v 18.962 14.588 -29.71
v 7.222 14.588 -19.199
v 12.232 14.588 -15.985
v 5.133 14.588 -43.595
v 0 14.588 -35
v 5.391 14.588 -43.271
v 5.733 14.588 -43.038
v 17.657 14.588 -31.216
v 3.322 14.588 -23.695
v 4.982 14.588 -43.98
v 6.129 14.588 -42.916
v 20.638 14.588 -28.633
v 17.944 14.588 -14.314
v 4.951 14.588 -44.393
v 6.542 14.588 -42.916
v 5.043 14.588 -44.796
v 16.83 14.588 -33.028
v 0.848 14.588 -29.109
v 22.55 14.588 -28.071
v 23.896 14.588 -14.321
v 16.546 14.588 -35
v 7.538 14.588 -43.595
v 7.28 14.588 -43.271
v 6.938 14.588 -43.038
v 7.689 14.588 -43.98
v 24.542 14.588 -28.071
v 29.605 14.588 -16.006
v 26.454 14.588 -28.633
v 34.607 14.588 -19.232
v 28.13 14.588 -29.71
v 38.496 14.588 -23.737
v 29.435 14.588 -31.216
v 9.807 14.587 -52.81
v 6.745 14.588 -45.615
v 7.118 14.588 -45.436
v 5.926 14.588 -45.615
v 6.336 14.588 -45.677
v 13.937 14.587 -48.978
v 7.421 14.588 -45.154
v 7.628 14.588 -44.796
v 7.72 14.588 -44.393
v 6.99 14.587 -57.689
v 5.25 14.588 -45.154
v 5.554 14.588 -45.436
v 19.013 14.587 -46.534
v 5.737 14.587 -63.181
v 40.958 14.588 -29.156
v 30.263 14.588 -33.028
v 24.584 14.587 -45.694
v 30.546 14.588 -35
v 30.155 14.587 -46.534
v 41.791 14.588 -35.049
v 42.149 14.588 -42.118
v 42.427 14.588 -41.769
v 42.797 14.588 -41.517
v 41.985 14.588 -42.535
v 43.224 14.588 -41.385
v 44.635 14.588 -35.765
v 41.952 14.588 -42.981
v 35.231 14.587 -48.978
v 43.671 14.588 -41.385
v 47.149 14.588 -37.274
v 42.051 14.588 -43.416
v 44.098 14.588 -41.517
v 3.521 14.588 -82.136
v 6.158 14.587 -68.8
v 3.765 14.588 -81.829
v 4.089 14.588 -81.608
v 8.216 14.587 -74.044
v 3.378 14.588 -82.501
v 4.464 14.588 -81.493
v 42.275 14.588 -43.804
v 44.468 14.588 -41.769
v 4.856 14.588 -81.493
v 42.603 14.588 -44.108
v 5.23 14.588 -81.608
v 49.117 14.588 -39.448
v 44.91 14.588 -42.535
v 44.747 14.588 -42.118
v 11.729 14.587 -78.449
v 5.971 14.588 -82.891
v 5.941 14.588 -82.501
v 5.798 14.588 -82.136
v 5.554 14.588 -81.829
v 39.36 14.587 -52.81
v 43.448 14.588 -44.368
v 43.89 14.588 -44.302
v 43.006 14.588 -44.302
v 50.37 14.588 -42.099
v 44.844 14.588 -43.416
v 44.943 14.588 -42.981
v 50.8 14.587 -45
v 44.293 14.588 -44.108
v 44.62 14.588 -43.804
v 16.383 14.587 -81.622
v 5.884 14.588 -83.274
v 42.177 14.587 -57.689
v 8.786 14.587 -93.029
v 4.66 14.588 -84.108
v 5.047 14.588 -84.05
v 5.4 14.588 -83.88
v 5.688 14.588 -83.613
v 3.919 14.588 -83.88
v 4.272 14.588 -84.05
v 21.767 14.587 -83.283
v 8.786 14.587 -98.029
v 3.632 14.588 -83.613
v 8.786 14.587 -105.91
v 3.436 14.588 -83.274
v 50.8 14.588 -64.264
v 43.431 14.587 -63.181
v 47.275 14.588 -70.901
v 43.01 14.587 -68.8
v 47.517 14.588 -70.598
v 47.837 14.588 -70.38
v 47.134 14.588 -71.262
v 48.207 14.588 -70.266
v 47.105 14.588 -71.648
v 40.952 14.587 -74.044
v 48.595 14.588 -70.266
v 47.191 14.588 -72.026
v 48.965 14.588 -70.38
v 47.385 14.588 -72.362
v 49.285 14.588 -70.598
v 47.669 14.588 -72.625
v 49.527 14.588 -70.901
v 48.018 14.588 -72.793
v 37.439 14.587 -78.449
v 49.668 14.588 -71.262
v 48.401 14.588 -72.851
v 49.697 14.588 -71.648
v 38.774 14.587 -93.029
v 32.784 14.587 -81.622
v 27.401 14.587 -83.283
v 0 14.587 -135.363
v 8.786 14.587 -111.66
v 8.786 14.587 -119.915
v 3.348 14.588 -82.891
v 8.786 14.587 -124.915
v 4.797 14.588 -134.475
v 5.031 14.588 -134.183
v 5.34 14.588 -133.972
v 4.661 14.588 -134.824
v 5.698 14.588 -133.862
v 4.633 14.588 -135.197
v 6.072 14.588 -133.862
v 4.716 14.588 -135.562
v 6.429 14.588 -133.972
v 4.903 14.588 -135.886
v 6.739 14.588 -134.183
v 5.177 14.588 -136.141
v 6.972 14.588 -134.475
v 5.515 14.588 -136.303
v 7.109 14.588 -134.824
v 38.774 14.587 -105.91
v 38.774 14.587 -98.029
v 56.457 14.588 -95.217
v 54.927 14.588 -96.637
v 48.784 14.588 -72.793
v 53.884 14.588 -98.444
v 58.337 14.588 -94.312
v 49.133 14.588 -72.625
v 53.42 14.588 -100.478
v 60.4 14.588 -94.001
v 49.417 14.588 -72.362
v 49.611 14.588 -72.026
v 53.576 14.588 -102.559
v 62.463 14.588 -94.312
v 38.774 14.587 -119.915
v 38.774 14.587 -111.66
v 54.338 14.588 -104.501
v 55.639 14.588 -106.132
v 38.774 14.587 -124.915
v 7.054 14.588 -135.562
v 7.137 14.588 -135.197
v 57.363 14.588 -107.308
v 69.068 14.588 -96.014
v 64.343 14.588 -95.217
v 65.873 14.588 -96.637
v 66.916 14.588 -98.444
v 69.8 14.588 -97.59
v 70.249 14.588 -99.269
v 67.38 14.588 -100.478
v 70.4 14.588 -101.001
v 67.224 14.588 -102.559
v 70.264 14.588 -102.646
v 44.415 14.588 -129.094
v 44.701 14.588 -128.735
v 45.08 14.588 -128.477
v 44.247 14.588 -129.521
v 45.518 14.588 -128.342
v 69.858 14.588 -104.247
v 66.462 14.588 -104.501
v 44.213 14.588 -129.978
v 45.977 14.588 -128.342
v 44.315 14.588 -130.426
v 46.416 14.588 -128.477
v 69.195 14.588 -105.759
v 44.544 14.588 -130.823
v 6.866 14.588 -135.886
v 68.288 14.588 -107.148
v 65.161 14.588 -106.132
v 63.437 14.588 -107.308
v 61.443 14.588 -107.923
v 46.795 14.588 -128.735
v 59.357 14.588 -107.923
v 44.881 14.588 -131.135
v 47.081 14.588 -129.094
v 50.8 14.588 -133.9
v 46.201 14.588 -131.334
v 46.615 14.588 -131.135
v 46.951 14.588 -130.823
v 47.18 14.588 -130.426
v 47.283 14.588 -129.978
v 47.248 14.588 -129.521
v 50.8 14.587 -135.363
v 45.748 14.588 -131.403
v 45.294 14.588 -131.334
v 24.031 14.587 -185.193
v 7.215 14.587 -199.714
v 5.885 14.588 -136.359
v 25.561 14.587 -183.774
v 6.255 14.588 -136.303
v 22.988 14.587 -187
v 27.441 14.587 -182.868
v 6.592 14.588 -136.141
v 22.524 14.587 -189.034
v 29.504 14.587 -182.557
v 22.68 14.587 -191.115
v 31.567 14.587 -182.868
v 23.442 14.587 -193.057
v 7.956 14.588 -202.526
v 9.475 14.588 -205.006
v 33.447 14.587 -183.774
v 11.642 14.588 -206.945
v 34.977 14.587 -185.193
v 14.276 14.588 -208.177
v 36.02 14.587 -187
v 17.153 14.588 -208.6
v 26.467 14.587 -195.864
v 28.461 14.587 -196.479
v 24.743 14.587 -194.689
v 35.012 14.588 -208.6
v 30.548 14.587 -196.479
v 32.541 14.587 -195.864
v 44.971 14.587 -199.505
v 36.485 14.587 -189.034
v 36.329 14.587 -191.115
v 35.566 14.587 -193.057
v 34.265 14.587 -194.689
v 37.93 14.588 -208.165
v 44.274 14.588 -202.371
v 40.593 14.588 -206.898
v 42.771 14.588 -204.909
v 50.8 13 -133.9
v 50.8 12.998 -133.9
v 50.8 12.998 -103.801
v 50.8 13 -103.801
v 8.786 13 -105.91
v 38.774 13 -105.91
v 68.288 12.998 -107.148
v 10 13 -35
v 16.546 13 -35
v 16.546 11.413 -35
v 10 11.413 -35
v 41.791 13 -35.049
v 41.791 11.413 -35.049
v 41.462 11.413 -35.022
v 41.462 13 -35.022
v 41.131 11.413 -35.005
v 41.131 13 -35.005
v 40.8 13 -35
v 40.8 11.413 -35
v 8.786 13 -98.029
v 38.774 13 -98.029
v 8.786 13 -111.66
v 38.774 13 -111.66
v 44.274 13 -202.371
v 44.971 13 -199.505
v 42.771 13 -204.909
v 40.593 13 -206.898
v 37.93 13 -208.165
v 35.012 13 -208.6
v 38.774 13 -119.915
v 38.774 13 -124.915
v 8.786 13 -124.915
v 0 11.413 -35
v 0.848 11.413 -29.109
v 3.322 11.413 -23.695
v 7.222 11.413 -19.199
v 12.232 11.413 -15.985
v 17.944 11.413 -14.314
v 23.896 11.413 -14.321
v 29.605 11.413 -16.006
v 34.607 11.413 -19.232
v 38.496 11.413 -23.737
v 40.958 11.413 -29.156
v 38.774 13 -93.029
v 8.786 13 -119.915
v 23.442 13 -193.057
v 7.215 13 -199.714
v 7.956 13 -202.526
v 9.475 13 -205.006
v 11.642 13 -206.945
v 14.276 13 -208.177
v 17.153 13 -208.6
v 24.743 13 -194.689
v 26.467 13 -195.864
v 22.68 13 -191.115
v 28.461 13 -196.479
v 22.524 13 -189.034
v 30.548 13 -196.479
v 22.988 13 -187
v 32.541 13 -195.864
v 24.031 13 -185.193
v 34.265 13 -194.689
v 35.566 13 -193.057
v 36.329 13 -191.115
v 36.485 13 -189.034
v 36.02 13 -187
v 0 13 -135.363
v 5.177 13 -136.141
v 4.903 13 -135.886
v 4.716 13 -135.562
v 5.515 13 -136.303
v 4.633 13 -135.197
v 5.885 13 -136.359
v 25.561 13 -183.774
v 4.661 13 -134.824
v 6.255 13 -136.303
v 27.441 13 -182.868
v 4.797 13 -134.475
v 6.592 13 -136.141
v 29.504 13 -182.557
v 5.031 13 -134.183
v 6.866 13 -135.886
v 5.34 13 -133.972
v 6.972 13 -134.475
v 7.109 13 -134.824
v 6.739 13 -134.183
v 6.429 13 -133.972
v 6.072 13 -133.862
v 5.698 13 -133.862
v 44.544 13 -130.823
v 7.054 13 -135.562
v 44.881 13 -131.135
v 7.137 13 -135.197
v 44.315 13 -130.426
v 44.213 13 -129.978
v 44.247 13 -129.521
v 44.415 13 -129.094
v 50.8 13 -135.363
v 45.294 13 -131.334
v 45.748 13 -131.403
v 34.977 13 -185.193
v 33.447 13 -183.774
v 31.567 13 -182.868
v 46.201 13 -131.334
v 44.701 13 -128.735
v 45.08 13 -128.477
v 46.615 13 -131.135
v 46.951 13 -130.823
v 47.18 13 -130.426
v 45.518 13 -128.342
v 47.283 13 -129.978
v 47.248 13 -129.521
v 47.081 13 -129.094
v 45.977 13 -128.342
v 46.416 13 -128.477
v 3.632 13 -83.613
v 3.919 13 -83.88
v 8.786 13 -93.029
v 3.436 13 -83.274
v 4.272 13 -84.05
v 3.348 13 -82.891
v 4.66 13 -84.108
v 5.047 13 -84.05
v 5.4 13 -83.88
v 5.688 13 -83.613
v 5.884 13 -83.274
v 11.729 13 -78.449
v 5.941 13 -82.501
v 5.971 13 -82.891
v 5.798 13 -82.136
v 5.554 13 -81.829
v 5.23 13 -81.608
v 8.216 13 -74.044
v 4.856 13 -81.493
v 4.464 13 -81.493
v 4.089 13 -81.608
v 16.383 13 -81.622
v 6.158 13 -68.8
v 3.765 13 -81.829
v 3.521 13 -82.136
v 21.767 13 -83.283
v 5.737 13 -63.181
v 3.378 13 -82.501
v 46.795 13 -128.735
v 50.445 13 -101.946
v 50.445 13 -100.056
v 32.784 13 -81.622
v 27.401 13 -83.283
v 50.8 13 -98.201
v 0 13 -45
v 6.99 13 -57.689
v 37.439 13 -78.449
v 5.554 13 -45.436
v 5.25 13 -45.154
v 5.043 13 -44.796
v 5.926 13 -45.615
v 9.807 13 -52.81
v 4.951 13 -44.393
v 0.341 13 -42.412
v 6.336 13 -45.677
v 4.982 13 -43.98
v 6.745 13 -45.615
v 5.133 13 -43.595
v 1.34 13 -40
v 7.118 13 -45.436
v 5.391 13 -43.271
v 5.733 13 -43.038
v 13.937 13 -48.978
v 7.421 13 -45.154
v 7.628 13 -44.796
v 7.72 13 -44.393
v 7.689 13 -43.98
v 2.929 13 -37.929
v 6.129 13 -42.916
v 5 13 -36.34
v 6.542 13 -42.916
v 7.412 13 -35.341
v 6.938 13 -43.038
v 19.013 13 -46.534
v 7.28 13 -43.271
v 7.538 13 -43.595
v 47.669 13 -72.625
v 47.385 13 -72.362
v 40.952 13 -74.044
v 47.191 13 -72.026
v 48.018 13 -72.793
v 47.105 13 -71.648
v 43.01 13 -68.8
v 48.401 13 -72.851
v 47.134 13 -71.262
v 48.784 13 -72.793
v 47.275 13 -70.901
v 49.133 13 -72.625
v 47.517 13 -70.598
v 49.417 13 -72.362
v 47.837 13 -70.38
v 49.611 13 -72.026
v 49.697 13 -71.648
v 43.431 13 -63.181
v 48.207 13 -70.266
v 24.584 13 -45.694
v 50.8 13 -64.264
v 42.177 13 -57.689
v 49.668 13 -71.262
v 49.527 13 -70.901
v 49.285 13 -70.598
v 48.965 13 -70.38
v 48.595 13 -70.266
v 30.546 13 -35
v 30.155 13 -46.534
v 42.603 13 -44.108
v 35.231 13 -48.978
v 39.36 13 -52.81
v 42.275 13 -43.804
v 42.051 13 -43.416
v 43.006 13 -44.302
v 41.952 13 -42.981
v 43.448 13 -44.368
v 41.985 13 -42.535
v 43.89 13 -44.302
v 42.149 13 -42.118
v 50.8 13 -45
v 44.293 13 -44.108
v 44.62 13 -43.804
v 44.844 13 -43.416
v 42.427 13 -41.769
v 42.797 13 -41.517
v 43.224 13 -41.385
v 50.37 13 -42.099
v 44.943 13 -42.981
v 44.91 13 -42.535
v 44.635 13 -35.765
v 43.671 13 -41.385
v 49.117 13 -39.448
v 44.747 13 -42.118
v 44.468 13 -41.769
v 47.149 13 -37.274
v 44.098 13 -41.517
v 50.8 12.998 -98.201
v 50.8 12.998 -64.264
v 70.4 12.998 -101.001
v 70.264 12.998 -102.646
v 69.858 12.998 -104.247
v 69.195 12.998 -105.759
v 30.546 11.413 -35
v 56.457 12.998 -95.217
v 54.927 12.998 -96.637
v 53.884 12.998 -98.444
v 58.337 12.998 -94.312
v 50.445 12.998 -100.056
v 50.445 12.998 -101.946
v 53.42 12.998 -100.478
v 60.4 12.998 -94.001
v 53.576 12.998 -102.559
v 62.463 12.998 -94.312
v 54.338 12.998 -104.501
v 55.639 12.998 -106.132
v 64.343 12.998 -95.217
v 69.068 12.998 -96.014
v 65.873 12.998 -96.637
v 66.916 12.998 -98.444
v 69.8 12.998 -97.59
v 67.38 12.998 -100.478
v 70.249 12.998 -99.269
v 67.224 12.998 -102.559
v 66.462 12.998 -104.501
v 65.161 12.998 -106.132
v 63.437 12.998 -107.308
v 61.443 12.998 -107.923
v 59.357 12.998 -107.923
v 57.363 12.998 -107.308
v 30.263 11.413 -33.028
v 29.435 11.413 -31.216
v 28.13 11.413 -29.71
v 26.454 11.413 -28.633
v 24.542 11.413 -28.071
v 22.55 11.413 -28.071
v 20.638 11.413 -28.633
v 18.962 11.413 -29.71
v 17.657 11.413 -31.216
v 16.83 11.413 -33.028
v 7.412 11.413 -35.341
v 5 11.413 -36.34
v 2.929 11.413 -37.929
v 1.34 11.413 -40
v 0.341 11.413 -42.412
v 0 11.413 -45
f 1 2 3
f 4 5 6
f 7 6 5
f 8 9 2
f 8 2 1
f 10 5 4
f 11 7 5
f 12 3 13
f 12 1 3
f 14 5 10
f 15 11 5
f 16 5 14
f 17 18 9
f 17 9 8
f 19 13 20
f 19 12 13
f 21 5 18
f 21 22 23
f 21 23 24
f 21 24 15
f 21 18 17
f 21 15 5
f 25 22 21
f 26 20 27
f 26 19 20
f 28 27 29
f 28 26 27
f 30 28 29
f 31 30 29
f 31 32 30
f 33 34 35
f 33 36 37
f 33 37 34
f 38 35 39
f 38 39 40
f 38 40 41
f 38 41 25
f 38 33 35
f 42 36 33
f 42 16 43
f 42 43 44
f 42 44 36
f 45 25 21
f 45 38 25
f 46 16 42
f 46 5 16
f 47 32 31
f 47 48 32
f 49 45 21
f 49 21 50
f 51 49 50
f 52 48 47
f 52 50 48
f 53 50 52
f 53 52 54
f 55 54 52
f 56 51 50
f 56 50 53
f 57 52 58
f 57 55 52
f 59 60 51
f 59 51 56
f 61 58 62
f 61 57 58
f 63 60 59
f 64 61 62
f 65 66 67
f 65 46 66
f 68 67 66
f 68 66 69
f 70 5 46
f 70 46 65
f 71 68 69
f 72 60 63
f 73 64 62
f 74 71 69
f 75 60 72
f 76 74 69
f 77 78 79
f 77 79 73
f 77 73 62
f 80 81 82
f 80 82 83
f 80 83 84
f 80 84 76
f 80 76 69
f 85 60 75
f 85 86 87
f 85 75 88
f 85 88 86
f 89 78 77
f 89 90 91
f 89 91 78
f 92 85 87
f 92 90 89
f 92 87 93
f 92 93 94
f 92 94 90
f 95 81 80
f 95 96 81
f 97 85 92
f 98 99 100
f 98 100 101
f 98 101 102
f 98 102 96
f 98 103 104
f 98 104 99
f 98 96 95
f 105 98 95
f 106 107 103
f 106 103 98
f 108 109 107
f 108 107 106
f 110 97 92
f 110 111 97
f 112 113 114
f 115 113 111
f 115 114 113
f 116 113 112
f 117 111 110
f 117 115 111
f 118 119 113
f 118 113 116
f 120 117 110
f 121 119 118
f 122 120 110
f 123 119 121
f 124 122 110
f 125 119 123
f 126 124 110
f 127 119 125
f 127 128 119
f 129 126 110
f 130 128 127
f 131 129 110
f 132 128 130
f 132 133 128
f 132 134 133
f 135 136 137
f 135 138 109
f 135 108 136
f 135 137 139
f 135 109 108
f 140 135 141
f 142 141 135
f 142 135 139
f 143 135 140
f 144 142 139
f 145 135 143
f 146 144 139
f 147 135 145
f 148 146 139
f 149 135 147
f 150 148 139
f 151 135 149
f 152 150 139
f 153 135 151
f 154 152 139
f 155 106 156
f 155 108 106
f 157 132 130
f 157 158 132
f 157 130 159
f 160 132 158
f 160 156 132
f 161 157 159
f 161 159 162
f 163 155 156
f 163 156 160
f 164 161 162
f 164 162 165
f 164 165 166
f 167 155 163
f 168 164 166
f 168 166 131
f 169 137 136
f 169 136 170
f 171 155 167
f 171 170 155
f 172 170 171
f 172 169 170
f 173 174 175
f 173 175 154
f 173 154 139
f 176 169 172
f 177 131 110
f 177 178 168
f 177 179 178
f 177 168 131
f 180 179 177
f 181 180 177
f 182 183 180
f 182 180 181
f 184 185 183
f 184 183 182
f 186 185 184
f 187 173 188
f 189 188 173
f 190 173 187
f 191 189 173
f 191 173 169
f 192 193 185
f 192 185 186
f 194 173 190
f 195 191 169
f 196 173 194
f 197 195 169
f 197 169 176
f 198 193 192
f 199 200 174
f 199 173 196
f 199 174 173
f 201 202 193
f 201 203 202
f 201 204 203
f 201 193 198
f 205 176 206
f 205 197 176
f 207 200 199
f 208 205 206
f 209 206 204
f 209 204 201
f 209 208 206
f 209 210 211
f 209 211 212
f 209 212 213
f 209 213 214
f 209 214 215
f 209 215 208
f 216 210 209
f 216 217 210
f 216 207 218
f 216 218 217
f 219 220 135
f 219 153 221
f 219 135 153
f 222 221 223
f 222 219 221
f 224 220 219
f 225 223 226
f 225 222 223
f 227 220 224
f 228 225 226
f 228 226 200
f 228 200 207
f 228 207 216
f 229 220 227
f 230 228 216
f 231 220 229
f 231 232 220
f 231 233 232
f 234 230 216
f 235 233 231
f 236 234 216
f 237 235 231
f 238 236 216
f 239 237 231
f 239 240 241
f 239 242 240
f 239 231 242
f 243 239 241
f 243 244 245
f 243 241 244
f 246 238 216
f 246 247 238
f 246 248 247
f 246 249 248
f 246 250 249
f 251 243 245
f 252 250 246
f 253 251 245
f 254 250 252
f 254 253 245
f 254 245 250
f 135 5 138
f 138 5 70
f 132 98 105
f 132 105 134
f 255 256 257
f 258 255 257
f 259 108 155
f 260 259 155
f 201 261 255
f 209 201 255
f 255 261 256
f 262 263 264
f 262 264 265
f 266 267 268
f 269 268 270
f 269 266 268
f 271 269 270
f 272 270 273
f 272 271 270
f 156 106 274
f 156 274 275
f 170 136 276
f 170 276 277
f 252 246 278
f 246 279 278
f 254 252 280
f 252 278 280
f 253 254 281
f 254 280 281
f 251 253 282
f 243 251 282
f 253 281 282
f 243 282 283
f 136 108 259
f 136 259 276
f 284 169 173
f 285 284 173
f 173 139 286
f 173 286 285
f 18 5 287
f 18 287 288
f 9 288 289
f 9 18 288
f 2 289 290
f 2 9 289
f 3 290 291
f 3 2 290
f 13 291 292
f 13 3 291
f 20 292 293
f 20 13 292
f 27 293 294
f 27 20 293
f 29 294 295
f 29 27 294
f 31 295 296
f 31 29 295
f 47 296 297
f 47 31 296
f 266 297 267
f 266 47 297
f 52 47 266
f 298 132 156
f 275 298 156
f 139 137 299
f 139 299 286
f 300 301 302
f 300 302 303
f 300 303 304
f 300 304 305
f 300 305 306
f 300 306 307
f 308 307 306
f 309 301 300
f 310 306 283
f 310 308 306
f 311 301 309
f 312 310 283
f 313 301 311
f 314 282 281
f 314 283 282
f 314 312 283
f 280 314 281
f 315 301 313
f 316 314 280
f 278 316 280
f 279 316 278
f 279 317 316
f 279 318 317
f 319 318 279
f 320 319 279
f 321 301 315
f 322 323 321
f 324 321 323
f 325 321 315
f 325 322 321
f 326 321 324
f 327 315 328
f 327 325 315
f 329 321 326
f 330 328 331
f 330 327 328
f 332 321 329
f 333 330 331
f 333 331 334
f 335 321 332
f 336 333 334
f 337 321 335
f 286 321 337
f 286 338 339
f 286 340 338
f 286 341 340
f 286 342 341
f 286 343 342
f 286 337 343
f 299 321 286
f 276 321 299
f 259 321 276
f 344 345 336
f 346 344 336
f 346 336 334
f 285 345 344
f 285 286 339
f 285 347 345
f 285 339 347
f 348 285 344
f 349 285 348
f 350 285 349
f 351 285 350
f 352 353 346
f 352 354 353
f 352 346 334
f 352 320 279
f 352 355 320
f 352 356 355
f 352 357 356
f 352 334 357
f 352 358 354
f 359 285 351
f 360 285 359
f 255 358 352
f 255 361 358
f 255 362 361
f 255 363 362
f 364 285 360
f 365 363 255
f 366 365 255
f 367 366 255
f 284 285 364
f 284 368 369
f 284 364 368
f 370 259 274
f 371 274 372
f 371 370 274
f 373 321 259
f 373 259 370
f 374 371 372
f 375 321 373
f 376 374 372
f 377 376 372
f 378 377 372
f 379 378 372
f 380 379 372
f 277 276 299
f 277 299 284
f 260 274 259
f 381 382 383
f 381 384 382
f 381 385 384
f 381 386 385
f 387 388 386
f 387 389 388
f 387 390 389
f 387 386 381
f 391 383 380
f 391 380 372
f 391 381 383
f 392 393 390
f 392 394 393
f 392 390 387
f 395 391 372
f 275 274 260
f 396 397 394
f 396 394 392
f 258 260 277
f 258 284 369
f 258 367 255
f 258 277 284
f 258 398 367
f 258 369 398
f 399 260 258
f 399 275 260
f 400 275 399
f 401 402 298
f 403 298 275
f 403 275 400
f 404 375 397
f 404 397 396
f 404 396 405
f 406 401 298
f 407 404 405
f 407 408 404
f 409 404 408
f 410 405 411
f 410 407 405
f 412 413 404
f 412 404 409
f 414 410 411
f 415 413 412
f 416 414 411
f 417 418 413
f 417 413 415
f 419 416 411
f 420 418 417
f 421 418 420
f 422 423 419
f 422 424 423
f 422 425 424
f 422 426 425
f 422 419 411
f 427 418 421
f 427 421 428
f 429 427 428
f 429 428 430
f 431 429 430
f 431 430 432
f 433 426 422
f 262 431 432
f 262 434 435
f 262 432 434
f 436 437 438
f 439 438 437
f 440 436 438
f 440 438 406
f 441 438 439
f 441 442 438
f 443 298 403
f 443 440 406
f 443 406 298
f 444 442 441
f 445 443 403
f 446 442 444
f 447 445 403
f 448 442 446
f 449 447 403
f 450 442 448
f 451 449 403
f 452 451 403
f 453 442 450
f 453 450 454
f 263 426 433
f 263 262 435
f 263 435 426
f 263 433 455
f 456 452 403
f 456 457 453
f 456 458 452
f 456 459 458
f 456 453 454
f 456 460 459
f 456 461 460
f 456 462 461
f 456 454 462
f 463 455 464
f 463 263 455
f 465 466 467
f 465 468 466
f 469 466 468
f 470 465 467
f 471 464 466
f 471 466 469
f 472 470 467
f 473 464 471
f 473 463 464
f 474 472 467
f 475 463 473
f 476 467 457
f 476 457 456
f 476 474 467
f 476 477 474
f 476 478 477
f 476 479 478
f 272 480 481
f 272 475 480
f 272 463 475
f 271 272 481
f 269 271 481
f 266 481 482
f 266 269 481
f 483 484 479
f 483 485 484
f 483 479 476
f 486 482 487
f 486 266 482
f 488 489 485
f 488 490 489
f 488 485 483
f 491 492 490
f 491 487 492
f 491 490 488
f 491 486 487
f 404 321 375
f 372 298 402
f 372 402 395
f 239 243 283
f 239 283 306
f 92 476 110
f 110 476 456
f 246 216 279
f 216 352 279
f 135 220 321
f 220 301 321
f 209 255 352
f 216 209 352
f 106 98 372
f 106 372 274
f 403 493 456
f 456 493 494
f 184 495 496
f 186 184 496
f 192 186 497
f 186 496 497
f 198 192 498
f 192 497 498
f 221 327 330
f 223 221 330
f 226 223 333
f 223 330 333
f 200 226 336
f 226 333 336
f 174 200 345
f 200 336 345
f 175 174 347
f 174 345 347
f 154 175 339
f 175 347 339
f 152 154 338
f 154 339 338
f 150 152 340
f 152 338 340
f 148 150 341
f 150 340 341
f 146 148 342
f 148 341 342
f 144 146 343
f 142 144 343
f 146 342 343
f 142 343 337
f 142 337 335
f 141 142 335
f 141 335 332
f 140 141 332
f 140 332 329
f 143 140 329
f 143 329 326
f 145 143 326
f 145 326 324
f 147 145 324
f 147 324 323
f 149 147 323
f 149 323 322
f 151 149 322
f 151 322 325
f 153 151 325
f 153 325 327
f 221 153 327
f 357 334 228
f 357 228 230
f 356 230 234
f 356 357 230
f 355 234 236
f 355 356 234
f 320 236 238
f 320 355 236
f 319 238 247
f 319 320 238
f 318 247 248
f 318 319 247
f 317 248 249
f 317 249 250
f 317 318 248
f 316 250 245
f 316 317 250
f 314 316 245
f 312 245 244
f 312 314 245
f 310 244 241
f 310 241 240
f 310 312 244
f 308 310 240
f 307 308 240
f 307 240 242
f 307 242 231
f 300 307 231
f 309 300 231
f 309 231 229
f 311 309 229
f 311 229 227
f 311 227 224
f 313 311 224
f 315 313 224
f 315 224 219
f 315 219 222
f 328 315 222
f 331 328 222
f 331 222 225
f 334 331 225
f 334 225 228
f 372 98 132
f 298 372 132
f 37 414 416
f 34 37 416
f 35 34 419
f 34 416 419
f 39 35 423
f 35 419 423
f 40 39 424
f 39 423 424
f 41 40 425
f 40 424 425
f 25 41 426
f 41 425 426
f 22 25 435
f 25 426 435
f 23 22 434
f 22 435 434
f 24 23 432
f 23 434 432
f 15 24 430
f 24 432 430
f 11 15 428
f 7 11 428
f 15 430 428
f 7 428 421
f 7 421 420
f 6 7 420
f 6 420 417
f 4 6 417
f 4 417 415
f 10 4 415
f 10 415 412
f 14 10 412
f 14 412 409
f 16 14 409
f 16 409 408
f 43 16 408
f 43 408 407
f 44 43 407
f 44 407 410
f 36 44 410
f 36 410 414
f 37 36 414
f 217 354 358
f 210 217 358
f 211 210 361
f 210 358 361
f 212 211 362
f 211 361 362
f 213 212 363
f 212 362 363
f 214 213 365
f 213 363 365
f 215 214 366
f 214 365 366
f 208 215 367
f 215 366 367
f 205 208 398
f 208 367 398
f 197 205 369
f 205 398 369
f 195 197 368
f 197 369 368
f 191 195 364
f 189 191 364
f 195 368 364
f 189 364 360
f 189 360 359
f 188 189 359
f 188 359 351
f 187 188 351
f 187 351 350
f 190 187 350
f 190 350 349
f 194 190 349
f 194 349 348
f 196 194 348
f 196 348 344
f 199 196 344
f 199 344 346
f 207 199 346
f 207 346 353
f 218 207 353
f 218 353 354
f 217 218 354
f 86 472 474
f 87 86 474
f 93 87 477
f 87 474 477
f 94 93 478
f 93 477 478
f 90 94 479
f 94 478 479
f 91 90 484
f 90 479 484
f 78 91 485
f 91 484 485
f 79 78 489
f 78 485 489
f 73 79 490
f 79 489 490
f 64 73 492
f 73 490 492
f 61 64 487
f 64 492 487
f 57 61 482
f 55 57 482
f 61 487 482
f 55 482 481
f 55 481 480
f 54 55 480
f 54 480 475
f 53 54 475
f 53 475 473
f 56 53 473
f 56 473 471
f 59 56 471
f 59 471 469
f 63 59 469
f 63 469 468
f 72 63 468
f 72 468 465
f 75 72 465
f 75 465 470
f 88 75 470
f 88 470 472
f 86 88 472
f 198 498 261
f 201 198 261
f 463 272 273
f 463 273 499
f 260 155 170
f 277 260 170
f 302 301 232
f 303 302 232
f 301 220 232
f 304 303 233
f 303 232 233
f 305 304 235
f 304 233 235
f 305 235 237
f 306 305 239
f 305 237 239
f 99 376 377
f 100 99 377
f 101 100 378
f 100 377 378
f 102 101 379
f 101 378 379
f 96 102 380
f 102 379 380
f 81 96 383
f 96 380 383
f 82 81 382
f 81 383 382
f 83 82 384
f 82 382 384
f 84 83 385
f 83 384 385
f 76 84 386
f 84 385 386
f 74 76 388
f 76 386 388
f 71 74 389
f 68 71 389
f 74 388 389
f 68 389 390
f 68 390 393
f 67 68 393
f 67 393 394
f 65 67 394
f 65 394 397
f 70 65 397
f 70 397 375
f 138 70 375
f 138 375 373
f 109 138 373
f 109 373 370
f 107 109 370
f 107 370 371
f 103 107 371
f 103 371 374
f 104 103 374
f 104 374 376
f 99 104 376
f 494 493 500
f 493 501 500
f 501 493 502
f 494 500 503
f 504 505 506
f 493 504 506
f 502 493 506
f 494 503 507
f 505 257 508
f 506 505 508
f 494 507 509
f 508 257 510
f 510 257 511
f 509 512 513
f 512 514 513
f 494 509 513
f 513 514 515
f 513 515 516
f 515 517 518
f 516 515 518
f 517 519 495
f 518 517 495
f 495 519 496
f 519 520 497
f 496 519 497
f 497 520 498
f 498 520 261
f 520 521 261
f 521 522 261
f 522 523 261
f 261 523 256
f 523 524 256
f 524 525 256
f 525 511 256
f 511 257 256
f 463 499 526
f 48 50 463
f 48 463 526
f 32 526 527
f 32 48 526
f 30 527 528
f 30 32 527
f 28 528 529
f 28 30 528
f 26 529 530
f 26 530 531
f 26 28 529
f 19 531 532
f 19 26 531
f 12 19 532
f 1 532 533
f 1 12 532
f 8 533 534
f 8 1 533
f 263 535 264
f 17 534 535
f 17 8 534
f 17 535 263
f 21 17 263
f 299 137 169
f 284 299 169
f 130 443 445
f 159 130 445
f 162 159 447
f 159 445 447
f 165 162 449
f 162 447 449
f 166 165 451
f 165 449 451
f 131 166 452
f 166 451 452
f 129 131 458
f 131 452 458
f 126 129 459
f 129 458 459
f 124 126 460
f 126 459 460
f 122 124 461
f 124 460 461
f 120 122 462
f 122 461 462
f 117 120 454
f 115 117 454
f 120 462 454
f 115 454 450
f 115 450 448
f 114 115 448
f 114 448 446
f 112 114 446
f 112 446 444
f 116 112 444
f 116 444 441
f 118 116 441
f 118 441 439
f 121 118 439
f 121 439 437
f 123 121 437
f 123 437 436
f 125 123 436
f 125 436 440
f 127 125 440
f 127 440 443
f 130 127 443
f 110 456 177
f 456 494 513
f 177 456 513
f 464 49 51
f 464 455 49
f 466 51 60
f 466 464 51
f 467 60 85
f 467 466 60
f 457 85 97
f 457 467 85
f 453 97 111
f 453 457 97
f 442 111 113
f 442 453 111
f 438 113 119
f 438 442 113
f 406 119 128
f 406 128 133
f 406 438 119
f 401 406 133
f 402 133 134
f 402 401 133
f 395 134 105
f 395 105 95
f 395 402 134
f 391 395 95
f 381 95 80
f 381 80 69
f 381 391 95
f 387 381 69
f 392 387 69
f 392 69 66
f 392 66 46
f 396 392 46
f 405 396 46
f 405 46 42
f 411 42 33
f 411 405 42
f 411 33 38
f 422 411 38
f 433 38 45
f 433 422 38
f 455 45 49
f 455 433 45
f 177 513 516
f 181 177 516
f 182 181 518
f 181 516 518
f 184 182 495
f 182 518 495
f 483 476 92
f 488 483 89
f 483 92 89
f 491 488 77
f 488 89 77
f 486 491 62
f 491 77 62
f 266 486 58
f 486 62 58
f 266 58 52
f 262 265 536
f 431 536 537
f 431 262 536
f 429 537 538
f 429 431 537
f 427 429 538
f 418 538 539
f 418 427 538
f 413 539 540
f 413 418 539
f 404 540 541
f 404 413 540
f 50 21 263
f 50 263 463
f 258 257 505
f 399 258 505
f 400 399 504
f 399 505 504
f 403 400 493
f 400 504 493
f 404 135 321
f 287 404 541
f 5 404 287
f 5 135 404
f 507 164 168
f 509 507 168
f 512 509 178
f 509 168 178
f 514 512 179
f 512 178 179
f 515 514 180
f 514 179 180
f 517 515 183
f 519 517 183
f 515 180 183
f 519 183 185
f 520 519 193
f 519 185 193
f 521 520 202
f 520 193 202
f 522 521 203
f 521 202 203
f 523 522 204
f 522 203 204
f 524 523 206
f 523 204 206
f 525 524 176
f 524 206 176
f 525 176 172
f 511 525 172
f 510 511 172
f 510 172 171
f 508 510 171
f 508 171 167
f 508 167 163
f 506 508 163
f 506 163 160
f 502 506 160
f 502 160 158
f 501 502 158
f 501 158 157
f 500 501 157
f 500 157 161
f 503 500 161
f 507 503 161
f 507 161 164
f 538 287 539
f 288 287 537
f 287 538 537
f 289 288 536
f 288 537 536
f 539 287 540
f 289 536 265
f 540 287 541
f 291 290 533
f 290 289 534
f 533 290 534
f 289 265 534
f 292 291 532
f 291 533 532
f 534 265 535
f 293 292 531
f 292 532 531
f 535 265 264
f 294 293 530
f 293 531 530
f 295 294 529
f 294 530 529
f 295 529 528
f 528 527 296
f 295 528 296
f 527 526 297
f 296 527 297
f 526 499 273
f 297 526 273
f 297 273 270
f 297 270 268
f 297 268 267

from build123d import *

# Parameters (mm, degrees)
SKETCH1_R           = 2.875
SKETCH1_R_2         = 7
BOSS_EXTRUDE1_DEPTH = 24.5875
SKETCH4_W           = 66.272407177
SKETCH4_H           = 27.800260981
CUT_EXTRUDE2_DEPTH  = 20
FILLET3_R           = 10
FILLET4_R           = 10
BOSS_EXTRUDE3_START = -1.5875
BOSS_EXTRUDE3_DEPTH = 1.5875
SKETCH7_R           = 7
CUT_EXTRUDE3_DEPTH  = 1.5875
CUT_EXTRUDE4_START  = -10
SKETCH8_R           = 3
SKETCH8_R_2         = 18.9
SKETCH8_R_3         = 2.875
SKETCH8_R_4         = 7
CUT_EXTRUDE4_DEPTH  = 10
SKETCH9_W           = 229.1070397
SKETCH9_H           = 361.266964835
SKETCH9_R           = 1.388229101
SKETCH9_R_2         = 1.483383261
SKETCH9_R_3         = 1.314910669
SKETCH9_R_4         = 1.248623853
SKETCH9_R_5         = 1.255629307
SKETCH9_R_6         = 1.53911217
CUT_EXTRUDE5_DEPTH  = 13
SKETCH10_W          = 29.988446547
SKETCH10_H          = 5
SKETCH10_H_2        = 5.75
CUT_EXTRUDE6_DEPTH  = 22
SKETCH11_R          = 5.236653548
CUT_EXTRUDE7_DEPTH  = 10
BOSS_EXTRUDE4_START = -1.59
BOSS_EXTRUDE4_DEPTH = 1.59
SKETCH13_R          = 7
CUT_EXTRUDE8_DEPTH  = 41
SKETCH14_W          = 61.491848917
SKETCH14_H          = 35.587491391
CUT_EXTRUDE9_DEPTH  = 20
FILLET5_R           = 10
SKETCH16_W          = 163.723031551
SKETCH16_H          = 22.872070304
CUT_EXTRUDE11_DEPTH = 35
FILLET6_R           = 10
SKETCH17_R          = 1.53911217
SKETCH17_R_2        = 1.255629307
SKETCH17_R_3        = 1.3
SKETCH17_R_4        = 1.314910669
SKETCH17_R_5        = 1.388229101
SKETCH17_R_6        = 1.5
CUT_EXTRUDE12_DEPTH = 42
CUT_EXTRUDE13_START = -30
SKETCH18_R          = 18.9
CUT_EXTRUDE13_DEPTH = 30
BOSS_EXTRUDE5_DEPTH = 3.175


with BuildPart() as part:
    # Sketch1 → Boss-Extrude1 (new body)
    with BuildSketch(Plane(origin=(0, 0, 0), x_dir=(1, 0, 0), z_dir=(0, 1, 0))):
        with BuildLine():
            Line((42.32729629, 228.6), (10.454309325, 228.6))
            Line((10.454309325, 228.6), (0, 135.362739137))
            Line((0, 135.362739137), (0, 0))
            Line((0, 0), (24.327009544, 0))
            Line((24.327009544, 0), (50.8, 0))
            Line((50.8, 0), (50.8, 64.87909603))
            Line((50.8, 64.87909603), (50.8, 87.423477361))
            Line((50.8, 87.423477361), (50.8, 98.200996728))
            ThreePointArc((50.8, 98.200996728), (50.4, 101.000996728), (50.8, 103.800996728))
            Line((50.8, 103.800996728), (50.8, 104.488200565))
            Line((50.8, 104.488200565), (50.8, 120.619222808))
            Line((50.8, 120.619222808), (50.8, 135.362739137))
            Line((50.8, 135.362739137), (42.32729629, 228.6))
        make_face()
        with Locations(Location((24.101759227, 108.78493524, 0), (0, 0, 270))):
            Circle(SKETCH1_R, mode=Mode.SUBTRACT)
        with Locations(Location((29.504213454, 189.557234372, 0), (0, 0, 270))):
            Circle(SKETCH1_R_2, mode=Mode.SUBTRACT)
    extrude(amount=BOSS_EXTRUDE1_DEPTH)

    # Sketch4 → Cut-Extrude2 (cut)
    with BuildSketch(Plane(origin=(0, 0, -228.6), x_dir=(-1, 0, 0), z_dir=(0, 0, -1))):
        with Locations((-28.174690156, -1.980940155)):
            Rectangle(SKETCH4_W, SKETCH4_H)
    extrude(amount=-CUT_EXTRUDE2_DEPTH, mode=Mode.SUBTRACT)

    # Fillet3
    fillet3_edges = [part.edges().sort_by_distance(p)[0] for p in [
        (44.144746445, 5.959595168, -208.6),
    ]]
    fillet(fillet3_edges, radius=FILLET3_R)

    # Fillet4
    fillet4_edges = [part.edges().sort_by_distance(p)[0] for p in [
        (50.8, 12.29375, 0),
        (0, 12.29375, 0),
        (8.211791854, 5.959595168, -208.6),
    ]]
    fillet(fillet4_edges, radius=FILLET4_R)

    # Sketch6 → Boss-Extrude3 (add)
    with BuildSketch(Plane(origin=(0, 24.5875, 0), x_dir=(1, 0, 0), z_dir=(0, 1, 0)).offset(BOSS_EXTRUDE3_START)):
        with BuildLine():
            Line((50.8, 135.362739137), (50.8, 103.800996728))
            ThreePointArc((50.8, 103.800996728), (50.4, 101.000996728), (50.8, 98.200996728))
            Line((50.8, 98.200996728), (50.8, 61.124243317))
            Line((50.8, 61.124243317), (69.258211507, 96.360728536))
            ThreePointArc((69.258211507, 96.360728536), (70.393157133, 101.370875786), (68.890940865, 106.283413148))
            Line((68.890940865, 106.283413148), (50.8, 135.362739137))
        make_face()
    extrude(amount=BOSS_EXTRUDE3_DEPTH)

    # Sketch7 → Cut-Extrude3 (cut)
    with BuildSketch(Plane(origin=(0, 24.5875, 0), x_dir=(1, 0, 0), z_dir=(0, 1, 0))):
        with Locations(Location((60.4, 101.000996728, 0), (0, 0, 270))):
            Circle(SKETCH7_R)
    extrude(amount=-CUT_EXTRUDE3_DEPTH, mode=Mode.SUBTRACT)

    # Sketch8 → Cut-Extrude4 (cut)
    with BuildSketch(Plane(origin=(0, 24.5875, 0), x_dir=(1, 0, 0), z_dir=(0, 1, 0)).offset(CUT_EXTRUDE4_START)):
        with BuildLine():
            Line((10.454309325, 228.6), (0, 135.362739137))
            Line((0, 135.362739137), (0, 10))
            ThreePointArc((0, 10), (2.928932188, 2.928932188), (10, 0))
            Line((10, 0), (40.8, 0))
            ThreePointArc((40.8, 0), (47.871067812, 2.928932188), (50.8, 10))
            Line((50.8, 10), (50.8, 61.124243317))
            Line((50.8, 61.124243317), (69.258211507, 96.360728536))
            ThreePointArc((69.258211507, 96.360728536), (70.393157133, 101.370875786), (68.890940865, 106.283413148))
            Line((68.890940865, 106.283413148), (50.8, 135.362739137))
            Line((50.8, 135.362739137), (42.32729629, 228.6))
            Line((42.32729629, 228.6), (10.454309325, 228.6))
        make_face()
        with Locations(Location((9.492033273, 118.909935242, 0), (0, 0, 270))):
            Circle(SKETCH8_R, mode=Mode.SUBTRACT)
        with Locations(Location((24.583834565, 64.593886665, 0), (0, 0, 270))):
            Circle(SKETCH8_R_2, mode=Mode.SUBTRACT)
        with Locations(Location((24.101759227, 108.78493524, 0), (0, 0, 270))):
            Circle(SKETCH8_R_3, mode=Mode.SUBTRACT)
        with Locations((60.4, 101.000996728)):
            Circle(SKETCH8_R_4, mode=Mode.SUBTRACT)
        with Locations(Location((29.504213454, 189.557234372, 0), (0, 0, 270))):
            Circle(SKETCH8_R_4, mode=Mode.SUBTRACT)
    extrude(amount=CUT_EXTRUDE4_DEPTH, mode=Mode.SUBTRACT)

    # Sketch9 → Cut-Extrude5 (cut)
    with BuildSketch(Plane.XZ):
        with Locations((19.903204009, -125.752229467)):
            Rectangle(SKETCH9_W, SKETCH9_H)
        with Locations(Location((6.335590122, -44.288799513, 0), (0, 0, 270))):
            Circle(SKETCH9_R, mode=Mode.SUBTRACT)
        with Locations(Location((43.447673368, -42.868436544, 0), (0, 0, 270))):
            Circle(SKETCH9_R_2, mode=Mode.SUBTRACT)
        with Locations(Location((4.659546827, -82.793173401, 0), (0, 0, 270))):
            Circle(SKETCH9_R_3, mode=Mode.SUBTRACT)
        with Locations(Location((48.400988852, -71.551011715, 0), (0, 0, 270))):
            Circle(SKETCH9_R_4, mode=Mode.SUBTRACT)
        with Locations(Location((5.88467603, -135.103145298, 0), (0, 0, 270))):
            Circle(SKETCH9_R_5, mode=Mode.SUBTRACT)
        with Locations(Location((45.747747887, -129.863467374, 0), (0, 0, 270))):
            Circle(SKETCH9_R_6, mode=Mode.SUBTRACT)
    extrude(amount=-CUT_EXTRUDE5_DEPTH, mode=Mode.SUBTRACT)

    # Sketch10 → Cut-Extrude6 (cut)
    with BuildSketch(Plane(origin=(0, 24.5875, 0), x_dir=(1, 0, 0), z_dir=(0, 1, 0))):
        with Locations((23.779803557, 122.41493524)):
            Rectangle(SKETCH10_W, SKETCH10_H)
        with Locations((23.779803557, 108.78493524)):
            Rectangle(SKETCH10_W, SKETCH10_H_2)
        with Locations((23.779803557, 95.528937895)):
            Rectangle(SKETCH10_W, SKETCH10_H)
    extrude(amount=-CUT_EXTRUDE6_DEPTH, mode=Mode.SUBTRACT)

    # Sketch11 → Cut-Extrude7 (cut)
    with BuildSketch(Plane(origin=(0, 24.5875, 0), x_dir=(1, 0, 0), z_dir=(0, 1, 0))):
        with Locations((8.535526315, 118.29502971)):
            Circle(SKETCH11_R)
    extrude(amount=-CUT_EXTRUDE7_DEPTH, mode=Mode.SUBTRACT)

    # Sketch12 → Boss-Extrude4 (add)
    with BuildSketch(Plane(origin=(0, 14.5875, 0), x_dir=(1, 0, 0), z_dir=(0, 1, 0)).offset(BOSS_EXTRUDE4_START)):
        with BuildLine():
            Line((68.287536191, 107.148091395), (50.8, 133.900488173))
            Line((50.8, 133.900488173), (50.8, 103.800996728))
            ThreePointArc((50.8, 103.800996728), (58.520134646, 110.822712782), (68.287536191, 107.148091395))
        make_face()
        with BuildLine():
            Line((69.19540964, 105.759228466), (68.287536191, 107.148091395))
            ThreePointArc((68.287536191, 107.148091395), (58.520134646, 110.822712782), (50.8, 103.800996728))
            ThreePointArc((50.8, 103.800996728), (50.4, 101.000996728), (50.8, 98.200996728))
            ThreePointArc((50.8, 98.200996728), (59.211240578, 91.07190558), (69.067690563, 96.013899345))
            ThreePointArc((69.067690563, 96.013899345), (70.061182785, 98.419999404), (70.4, 101.000996728))
            ThreePointArc((70.4, 101.000996728), (70.094175994, 103.455167016), (69.19540964, 105.759228466))
        make_face()
        with BuildLine():
            ThreePointArc((69.067690563, 96.013899345), (59.211240578, 91.07190558), (50.8, 98.200996728))
            Line((50.8, 98.200996728), (50.8, 64.264230765))
            Line((50.8, 64.264230765), (69.067690563, 96.013899345))
        make_face()
    extrude(amount=BOSS_EXTRUDE4_DEPTH)

    # Sketch13 → Cut-Extrude8 (cut)
    with BuildSketch(Plane(origin=(0, 14.5875, 0), x_dir=(1, 0, 0), z_dir=(0, 1, 0))):
        with Locations(Location((60.4, 101.000996728, 0), (0, 0, 270))):
            Circle(SKETCH13_R)
    extrude(amount=-CUT_EXTRUDE8_DEPTH, mode=Mode.SUBTRACT)

    # Sketch14 → Cut-Extrude9 (cut)
    with BuildSketch(Plane(origin=(0, 0, -228.6), x_dir=(-1, 0, 0), z_dir=(0, 0, -1))):
        with Locations((-33.296946078, 21.381494753)):
            Rectangle(SKETCH14_W, SKETCH14_H)
    extrude(amount=-CUT_EXTRUDE9_DEPTH, mode=Mode.SUBTRACT)

    # Fillet5
    fillet5_edges = [part.edges().sort_by_distance(p)[0] for p in [
        (44.144746445, 13.79375, -208.6),
        (8.211791854, 13.79375, -208.6),
    ]]
    fillet(fillet5_edges, radius=FILLET5_R)

    # Sketch16 → Cut-Extrude11 (cut)
    with BuildSketch(Plane.XY):
        with Locations((6.935844153, 9.456999915)):
            Rectangle(SKETCH16_W, SKETCH16_H)
    extrude(amount=-CUT_EXTRUDE11_DEPTH, mode=Mode.SUBTRACT)

    # Fillet6
    fillet6_edges = [part.edges().sort_by_distance(p)[0] for p in [
        (0, 13.79375, -35),
        (50.8, 13.79375, -35),
    ]]
    fillet(fillet6_edges, radius=FILLET6_R)

    # Sketch17 → Cut-Extrude12 (cut)
    with BuildSketch(Plane.XZ):
        with Locations(Location((45.747747887, -129.863467374, 0), (0, 0, 270))):
            Circle(SKETCH17_R)
        with Locations(Location((5.88467603, -135.103145298, 0), (0, 0, 270))):
            Circle(SKETCH17_R_2)
        with Locations(Location((48.400988852, -71.551011715, 0), (0, 0, 270))):
            Circle(SKETCH17_R_3)
        with Locations(Location((4.659546827, -82.793173401, 0), (0, 0, 270))):
            Circle(SKETCH17_R_4)
        with Locations(Location((6.335590122, -44.288799513, 0), (0, 0, 270))):
            Circle(SKETCH17_R_5)
        with Locations(Location((43.447673368, -42.868436544, 0), (0, 0, 270))):
            Circle(SKETCH17_R_6)
    extrude(amount=-CUT_EXTRUDE12_DEPTH, mode=Mode.SUBTRACT)

    # Sketch18 → Cut-Extrude13 (cut)
    with BuildSketch(Plane(origin=(0, 24.5875, 0), x_dir=(1, 0, 0), z_dir=(0, 1, 0)).offset(CUT_EXTRUDE13_START)):
        with Locations(Location((24.583834565, 64.593886665, 0), (0, 0, 270))):
            Circle(SKETCH18_R)
    extrude(amount=CUT_EXTRUDE13_DEPTH, mode=Mode.SUBTRACT)

    # Sketch19 → Boss-Extrude5 (add)
    with BuildSketch(Plane(origin=(0, 14.5875, 0), x_dir=(1, 0, 0), z_dir=(0, 1, 0))):
        with BuildLine():
            ThreePointArc((10, 35), (2.928932188, 37.928932188), (0, 45))
            Line((0, 45), (0, 35))
            ThreePointArc((0, 35), (20.920362417, 14.10428472), (41.791401522, 35.049265202))
            ThreePointArc((41.791401522, 35.049265202), (41.296312411, 35.012323894), (40.8, 35))
            Line((40.8, 35), (30.546186564, 35))
            ThreePointArc((30.546186564, 35), (23.546186564, 28), (16.546186564, 35))
            Line((16.546186564, 35), (10, 35))
        make_face()
    extrude(amount=-BOSS_EXTRUDE5_DEPTH)


solid = part.part
